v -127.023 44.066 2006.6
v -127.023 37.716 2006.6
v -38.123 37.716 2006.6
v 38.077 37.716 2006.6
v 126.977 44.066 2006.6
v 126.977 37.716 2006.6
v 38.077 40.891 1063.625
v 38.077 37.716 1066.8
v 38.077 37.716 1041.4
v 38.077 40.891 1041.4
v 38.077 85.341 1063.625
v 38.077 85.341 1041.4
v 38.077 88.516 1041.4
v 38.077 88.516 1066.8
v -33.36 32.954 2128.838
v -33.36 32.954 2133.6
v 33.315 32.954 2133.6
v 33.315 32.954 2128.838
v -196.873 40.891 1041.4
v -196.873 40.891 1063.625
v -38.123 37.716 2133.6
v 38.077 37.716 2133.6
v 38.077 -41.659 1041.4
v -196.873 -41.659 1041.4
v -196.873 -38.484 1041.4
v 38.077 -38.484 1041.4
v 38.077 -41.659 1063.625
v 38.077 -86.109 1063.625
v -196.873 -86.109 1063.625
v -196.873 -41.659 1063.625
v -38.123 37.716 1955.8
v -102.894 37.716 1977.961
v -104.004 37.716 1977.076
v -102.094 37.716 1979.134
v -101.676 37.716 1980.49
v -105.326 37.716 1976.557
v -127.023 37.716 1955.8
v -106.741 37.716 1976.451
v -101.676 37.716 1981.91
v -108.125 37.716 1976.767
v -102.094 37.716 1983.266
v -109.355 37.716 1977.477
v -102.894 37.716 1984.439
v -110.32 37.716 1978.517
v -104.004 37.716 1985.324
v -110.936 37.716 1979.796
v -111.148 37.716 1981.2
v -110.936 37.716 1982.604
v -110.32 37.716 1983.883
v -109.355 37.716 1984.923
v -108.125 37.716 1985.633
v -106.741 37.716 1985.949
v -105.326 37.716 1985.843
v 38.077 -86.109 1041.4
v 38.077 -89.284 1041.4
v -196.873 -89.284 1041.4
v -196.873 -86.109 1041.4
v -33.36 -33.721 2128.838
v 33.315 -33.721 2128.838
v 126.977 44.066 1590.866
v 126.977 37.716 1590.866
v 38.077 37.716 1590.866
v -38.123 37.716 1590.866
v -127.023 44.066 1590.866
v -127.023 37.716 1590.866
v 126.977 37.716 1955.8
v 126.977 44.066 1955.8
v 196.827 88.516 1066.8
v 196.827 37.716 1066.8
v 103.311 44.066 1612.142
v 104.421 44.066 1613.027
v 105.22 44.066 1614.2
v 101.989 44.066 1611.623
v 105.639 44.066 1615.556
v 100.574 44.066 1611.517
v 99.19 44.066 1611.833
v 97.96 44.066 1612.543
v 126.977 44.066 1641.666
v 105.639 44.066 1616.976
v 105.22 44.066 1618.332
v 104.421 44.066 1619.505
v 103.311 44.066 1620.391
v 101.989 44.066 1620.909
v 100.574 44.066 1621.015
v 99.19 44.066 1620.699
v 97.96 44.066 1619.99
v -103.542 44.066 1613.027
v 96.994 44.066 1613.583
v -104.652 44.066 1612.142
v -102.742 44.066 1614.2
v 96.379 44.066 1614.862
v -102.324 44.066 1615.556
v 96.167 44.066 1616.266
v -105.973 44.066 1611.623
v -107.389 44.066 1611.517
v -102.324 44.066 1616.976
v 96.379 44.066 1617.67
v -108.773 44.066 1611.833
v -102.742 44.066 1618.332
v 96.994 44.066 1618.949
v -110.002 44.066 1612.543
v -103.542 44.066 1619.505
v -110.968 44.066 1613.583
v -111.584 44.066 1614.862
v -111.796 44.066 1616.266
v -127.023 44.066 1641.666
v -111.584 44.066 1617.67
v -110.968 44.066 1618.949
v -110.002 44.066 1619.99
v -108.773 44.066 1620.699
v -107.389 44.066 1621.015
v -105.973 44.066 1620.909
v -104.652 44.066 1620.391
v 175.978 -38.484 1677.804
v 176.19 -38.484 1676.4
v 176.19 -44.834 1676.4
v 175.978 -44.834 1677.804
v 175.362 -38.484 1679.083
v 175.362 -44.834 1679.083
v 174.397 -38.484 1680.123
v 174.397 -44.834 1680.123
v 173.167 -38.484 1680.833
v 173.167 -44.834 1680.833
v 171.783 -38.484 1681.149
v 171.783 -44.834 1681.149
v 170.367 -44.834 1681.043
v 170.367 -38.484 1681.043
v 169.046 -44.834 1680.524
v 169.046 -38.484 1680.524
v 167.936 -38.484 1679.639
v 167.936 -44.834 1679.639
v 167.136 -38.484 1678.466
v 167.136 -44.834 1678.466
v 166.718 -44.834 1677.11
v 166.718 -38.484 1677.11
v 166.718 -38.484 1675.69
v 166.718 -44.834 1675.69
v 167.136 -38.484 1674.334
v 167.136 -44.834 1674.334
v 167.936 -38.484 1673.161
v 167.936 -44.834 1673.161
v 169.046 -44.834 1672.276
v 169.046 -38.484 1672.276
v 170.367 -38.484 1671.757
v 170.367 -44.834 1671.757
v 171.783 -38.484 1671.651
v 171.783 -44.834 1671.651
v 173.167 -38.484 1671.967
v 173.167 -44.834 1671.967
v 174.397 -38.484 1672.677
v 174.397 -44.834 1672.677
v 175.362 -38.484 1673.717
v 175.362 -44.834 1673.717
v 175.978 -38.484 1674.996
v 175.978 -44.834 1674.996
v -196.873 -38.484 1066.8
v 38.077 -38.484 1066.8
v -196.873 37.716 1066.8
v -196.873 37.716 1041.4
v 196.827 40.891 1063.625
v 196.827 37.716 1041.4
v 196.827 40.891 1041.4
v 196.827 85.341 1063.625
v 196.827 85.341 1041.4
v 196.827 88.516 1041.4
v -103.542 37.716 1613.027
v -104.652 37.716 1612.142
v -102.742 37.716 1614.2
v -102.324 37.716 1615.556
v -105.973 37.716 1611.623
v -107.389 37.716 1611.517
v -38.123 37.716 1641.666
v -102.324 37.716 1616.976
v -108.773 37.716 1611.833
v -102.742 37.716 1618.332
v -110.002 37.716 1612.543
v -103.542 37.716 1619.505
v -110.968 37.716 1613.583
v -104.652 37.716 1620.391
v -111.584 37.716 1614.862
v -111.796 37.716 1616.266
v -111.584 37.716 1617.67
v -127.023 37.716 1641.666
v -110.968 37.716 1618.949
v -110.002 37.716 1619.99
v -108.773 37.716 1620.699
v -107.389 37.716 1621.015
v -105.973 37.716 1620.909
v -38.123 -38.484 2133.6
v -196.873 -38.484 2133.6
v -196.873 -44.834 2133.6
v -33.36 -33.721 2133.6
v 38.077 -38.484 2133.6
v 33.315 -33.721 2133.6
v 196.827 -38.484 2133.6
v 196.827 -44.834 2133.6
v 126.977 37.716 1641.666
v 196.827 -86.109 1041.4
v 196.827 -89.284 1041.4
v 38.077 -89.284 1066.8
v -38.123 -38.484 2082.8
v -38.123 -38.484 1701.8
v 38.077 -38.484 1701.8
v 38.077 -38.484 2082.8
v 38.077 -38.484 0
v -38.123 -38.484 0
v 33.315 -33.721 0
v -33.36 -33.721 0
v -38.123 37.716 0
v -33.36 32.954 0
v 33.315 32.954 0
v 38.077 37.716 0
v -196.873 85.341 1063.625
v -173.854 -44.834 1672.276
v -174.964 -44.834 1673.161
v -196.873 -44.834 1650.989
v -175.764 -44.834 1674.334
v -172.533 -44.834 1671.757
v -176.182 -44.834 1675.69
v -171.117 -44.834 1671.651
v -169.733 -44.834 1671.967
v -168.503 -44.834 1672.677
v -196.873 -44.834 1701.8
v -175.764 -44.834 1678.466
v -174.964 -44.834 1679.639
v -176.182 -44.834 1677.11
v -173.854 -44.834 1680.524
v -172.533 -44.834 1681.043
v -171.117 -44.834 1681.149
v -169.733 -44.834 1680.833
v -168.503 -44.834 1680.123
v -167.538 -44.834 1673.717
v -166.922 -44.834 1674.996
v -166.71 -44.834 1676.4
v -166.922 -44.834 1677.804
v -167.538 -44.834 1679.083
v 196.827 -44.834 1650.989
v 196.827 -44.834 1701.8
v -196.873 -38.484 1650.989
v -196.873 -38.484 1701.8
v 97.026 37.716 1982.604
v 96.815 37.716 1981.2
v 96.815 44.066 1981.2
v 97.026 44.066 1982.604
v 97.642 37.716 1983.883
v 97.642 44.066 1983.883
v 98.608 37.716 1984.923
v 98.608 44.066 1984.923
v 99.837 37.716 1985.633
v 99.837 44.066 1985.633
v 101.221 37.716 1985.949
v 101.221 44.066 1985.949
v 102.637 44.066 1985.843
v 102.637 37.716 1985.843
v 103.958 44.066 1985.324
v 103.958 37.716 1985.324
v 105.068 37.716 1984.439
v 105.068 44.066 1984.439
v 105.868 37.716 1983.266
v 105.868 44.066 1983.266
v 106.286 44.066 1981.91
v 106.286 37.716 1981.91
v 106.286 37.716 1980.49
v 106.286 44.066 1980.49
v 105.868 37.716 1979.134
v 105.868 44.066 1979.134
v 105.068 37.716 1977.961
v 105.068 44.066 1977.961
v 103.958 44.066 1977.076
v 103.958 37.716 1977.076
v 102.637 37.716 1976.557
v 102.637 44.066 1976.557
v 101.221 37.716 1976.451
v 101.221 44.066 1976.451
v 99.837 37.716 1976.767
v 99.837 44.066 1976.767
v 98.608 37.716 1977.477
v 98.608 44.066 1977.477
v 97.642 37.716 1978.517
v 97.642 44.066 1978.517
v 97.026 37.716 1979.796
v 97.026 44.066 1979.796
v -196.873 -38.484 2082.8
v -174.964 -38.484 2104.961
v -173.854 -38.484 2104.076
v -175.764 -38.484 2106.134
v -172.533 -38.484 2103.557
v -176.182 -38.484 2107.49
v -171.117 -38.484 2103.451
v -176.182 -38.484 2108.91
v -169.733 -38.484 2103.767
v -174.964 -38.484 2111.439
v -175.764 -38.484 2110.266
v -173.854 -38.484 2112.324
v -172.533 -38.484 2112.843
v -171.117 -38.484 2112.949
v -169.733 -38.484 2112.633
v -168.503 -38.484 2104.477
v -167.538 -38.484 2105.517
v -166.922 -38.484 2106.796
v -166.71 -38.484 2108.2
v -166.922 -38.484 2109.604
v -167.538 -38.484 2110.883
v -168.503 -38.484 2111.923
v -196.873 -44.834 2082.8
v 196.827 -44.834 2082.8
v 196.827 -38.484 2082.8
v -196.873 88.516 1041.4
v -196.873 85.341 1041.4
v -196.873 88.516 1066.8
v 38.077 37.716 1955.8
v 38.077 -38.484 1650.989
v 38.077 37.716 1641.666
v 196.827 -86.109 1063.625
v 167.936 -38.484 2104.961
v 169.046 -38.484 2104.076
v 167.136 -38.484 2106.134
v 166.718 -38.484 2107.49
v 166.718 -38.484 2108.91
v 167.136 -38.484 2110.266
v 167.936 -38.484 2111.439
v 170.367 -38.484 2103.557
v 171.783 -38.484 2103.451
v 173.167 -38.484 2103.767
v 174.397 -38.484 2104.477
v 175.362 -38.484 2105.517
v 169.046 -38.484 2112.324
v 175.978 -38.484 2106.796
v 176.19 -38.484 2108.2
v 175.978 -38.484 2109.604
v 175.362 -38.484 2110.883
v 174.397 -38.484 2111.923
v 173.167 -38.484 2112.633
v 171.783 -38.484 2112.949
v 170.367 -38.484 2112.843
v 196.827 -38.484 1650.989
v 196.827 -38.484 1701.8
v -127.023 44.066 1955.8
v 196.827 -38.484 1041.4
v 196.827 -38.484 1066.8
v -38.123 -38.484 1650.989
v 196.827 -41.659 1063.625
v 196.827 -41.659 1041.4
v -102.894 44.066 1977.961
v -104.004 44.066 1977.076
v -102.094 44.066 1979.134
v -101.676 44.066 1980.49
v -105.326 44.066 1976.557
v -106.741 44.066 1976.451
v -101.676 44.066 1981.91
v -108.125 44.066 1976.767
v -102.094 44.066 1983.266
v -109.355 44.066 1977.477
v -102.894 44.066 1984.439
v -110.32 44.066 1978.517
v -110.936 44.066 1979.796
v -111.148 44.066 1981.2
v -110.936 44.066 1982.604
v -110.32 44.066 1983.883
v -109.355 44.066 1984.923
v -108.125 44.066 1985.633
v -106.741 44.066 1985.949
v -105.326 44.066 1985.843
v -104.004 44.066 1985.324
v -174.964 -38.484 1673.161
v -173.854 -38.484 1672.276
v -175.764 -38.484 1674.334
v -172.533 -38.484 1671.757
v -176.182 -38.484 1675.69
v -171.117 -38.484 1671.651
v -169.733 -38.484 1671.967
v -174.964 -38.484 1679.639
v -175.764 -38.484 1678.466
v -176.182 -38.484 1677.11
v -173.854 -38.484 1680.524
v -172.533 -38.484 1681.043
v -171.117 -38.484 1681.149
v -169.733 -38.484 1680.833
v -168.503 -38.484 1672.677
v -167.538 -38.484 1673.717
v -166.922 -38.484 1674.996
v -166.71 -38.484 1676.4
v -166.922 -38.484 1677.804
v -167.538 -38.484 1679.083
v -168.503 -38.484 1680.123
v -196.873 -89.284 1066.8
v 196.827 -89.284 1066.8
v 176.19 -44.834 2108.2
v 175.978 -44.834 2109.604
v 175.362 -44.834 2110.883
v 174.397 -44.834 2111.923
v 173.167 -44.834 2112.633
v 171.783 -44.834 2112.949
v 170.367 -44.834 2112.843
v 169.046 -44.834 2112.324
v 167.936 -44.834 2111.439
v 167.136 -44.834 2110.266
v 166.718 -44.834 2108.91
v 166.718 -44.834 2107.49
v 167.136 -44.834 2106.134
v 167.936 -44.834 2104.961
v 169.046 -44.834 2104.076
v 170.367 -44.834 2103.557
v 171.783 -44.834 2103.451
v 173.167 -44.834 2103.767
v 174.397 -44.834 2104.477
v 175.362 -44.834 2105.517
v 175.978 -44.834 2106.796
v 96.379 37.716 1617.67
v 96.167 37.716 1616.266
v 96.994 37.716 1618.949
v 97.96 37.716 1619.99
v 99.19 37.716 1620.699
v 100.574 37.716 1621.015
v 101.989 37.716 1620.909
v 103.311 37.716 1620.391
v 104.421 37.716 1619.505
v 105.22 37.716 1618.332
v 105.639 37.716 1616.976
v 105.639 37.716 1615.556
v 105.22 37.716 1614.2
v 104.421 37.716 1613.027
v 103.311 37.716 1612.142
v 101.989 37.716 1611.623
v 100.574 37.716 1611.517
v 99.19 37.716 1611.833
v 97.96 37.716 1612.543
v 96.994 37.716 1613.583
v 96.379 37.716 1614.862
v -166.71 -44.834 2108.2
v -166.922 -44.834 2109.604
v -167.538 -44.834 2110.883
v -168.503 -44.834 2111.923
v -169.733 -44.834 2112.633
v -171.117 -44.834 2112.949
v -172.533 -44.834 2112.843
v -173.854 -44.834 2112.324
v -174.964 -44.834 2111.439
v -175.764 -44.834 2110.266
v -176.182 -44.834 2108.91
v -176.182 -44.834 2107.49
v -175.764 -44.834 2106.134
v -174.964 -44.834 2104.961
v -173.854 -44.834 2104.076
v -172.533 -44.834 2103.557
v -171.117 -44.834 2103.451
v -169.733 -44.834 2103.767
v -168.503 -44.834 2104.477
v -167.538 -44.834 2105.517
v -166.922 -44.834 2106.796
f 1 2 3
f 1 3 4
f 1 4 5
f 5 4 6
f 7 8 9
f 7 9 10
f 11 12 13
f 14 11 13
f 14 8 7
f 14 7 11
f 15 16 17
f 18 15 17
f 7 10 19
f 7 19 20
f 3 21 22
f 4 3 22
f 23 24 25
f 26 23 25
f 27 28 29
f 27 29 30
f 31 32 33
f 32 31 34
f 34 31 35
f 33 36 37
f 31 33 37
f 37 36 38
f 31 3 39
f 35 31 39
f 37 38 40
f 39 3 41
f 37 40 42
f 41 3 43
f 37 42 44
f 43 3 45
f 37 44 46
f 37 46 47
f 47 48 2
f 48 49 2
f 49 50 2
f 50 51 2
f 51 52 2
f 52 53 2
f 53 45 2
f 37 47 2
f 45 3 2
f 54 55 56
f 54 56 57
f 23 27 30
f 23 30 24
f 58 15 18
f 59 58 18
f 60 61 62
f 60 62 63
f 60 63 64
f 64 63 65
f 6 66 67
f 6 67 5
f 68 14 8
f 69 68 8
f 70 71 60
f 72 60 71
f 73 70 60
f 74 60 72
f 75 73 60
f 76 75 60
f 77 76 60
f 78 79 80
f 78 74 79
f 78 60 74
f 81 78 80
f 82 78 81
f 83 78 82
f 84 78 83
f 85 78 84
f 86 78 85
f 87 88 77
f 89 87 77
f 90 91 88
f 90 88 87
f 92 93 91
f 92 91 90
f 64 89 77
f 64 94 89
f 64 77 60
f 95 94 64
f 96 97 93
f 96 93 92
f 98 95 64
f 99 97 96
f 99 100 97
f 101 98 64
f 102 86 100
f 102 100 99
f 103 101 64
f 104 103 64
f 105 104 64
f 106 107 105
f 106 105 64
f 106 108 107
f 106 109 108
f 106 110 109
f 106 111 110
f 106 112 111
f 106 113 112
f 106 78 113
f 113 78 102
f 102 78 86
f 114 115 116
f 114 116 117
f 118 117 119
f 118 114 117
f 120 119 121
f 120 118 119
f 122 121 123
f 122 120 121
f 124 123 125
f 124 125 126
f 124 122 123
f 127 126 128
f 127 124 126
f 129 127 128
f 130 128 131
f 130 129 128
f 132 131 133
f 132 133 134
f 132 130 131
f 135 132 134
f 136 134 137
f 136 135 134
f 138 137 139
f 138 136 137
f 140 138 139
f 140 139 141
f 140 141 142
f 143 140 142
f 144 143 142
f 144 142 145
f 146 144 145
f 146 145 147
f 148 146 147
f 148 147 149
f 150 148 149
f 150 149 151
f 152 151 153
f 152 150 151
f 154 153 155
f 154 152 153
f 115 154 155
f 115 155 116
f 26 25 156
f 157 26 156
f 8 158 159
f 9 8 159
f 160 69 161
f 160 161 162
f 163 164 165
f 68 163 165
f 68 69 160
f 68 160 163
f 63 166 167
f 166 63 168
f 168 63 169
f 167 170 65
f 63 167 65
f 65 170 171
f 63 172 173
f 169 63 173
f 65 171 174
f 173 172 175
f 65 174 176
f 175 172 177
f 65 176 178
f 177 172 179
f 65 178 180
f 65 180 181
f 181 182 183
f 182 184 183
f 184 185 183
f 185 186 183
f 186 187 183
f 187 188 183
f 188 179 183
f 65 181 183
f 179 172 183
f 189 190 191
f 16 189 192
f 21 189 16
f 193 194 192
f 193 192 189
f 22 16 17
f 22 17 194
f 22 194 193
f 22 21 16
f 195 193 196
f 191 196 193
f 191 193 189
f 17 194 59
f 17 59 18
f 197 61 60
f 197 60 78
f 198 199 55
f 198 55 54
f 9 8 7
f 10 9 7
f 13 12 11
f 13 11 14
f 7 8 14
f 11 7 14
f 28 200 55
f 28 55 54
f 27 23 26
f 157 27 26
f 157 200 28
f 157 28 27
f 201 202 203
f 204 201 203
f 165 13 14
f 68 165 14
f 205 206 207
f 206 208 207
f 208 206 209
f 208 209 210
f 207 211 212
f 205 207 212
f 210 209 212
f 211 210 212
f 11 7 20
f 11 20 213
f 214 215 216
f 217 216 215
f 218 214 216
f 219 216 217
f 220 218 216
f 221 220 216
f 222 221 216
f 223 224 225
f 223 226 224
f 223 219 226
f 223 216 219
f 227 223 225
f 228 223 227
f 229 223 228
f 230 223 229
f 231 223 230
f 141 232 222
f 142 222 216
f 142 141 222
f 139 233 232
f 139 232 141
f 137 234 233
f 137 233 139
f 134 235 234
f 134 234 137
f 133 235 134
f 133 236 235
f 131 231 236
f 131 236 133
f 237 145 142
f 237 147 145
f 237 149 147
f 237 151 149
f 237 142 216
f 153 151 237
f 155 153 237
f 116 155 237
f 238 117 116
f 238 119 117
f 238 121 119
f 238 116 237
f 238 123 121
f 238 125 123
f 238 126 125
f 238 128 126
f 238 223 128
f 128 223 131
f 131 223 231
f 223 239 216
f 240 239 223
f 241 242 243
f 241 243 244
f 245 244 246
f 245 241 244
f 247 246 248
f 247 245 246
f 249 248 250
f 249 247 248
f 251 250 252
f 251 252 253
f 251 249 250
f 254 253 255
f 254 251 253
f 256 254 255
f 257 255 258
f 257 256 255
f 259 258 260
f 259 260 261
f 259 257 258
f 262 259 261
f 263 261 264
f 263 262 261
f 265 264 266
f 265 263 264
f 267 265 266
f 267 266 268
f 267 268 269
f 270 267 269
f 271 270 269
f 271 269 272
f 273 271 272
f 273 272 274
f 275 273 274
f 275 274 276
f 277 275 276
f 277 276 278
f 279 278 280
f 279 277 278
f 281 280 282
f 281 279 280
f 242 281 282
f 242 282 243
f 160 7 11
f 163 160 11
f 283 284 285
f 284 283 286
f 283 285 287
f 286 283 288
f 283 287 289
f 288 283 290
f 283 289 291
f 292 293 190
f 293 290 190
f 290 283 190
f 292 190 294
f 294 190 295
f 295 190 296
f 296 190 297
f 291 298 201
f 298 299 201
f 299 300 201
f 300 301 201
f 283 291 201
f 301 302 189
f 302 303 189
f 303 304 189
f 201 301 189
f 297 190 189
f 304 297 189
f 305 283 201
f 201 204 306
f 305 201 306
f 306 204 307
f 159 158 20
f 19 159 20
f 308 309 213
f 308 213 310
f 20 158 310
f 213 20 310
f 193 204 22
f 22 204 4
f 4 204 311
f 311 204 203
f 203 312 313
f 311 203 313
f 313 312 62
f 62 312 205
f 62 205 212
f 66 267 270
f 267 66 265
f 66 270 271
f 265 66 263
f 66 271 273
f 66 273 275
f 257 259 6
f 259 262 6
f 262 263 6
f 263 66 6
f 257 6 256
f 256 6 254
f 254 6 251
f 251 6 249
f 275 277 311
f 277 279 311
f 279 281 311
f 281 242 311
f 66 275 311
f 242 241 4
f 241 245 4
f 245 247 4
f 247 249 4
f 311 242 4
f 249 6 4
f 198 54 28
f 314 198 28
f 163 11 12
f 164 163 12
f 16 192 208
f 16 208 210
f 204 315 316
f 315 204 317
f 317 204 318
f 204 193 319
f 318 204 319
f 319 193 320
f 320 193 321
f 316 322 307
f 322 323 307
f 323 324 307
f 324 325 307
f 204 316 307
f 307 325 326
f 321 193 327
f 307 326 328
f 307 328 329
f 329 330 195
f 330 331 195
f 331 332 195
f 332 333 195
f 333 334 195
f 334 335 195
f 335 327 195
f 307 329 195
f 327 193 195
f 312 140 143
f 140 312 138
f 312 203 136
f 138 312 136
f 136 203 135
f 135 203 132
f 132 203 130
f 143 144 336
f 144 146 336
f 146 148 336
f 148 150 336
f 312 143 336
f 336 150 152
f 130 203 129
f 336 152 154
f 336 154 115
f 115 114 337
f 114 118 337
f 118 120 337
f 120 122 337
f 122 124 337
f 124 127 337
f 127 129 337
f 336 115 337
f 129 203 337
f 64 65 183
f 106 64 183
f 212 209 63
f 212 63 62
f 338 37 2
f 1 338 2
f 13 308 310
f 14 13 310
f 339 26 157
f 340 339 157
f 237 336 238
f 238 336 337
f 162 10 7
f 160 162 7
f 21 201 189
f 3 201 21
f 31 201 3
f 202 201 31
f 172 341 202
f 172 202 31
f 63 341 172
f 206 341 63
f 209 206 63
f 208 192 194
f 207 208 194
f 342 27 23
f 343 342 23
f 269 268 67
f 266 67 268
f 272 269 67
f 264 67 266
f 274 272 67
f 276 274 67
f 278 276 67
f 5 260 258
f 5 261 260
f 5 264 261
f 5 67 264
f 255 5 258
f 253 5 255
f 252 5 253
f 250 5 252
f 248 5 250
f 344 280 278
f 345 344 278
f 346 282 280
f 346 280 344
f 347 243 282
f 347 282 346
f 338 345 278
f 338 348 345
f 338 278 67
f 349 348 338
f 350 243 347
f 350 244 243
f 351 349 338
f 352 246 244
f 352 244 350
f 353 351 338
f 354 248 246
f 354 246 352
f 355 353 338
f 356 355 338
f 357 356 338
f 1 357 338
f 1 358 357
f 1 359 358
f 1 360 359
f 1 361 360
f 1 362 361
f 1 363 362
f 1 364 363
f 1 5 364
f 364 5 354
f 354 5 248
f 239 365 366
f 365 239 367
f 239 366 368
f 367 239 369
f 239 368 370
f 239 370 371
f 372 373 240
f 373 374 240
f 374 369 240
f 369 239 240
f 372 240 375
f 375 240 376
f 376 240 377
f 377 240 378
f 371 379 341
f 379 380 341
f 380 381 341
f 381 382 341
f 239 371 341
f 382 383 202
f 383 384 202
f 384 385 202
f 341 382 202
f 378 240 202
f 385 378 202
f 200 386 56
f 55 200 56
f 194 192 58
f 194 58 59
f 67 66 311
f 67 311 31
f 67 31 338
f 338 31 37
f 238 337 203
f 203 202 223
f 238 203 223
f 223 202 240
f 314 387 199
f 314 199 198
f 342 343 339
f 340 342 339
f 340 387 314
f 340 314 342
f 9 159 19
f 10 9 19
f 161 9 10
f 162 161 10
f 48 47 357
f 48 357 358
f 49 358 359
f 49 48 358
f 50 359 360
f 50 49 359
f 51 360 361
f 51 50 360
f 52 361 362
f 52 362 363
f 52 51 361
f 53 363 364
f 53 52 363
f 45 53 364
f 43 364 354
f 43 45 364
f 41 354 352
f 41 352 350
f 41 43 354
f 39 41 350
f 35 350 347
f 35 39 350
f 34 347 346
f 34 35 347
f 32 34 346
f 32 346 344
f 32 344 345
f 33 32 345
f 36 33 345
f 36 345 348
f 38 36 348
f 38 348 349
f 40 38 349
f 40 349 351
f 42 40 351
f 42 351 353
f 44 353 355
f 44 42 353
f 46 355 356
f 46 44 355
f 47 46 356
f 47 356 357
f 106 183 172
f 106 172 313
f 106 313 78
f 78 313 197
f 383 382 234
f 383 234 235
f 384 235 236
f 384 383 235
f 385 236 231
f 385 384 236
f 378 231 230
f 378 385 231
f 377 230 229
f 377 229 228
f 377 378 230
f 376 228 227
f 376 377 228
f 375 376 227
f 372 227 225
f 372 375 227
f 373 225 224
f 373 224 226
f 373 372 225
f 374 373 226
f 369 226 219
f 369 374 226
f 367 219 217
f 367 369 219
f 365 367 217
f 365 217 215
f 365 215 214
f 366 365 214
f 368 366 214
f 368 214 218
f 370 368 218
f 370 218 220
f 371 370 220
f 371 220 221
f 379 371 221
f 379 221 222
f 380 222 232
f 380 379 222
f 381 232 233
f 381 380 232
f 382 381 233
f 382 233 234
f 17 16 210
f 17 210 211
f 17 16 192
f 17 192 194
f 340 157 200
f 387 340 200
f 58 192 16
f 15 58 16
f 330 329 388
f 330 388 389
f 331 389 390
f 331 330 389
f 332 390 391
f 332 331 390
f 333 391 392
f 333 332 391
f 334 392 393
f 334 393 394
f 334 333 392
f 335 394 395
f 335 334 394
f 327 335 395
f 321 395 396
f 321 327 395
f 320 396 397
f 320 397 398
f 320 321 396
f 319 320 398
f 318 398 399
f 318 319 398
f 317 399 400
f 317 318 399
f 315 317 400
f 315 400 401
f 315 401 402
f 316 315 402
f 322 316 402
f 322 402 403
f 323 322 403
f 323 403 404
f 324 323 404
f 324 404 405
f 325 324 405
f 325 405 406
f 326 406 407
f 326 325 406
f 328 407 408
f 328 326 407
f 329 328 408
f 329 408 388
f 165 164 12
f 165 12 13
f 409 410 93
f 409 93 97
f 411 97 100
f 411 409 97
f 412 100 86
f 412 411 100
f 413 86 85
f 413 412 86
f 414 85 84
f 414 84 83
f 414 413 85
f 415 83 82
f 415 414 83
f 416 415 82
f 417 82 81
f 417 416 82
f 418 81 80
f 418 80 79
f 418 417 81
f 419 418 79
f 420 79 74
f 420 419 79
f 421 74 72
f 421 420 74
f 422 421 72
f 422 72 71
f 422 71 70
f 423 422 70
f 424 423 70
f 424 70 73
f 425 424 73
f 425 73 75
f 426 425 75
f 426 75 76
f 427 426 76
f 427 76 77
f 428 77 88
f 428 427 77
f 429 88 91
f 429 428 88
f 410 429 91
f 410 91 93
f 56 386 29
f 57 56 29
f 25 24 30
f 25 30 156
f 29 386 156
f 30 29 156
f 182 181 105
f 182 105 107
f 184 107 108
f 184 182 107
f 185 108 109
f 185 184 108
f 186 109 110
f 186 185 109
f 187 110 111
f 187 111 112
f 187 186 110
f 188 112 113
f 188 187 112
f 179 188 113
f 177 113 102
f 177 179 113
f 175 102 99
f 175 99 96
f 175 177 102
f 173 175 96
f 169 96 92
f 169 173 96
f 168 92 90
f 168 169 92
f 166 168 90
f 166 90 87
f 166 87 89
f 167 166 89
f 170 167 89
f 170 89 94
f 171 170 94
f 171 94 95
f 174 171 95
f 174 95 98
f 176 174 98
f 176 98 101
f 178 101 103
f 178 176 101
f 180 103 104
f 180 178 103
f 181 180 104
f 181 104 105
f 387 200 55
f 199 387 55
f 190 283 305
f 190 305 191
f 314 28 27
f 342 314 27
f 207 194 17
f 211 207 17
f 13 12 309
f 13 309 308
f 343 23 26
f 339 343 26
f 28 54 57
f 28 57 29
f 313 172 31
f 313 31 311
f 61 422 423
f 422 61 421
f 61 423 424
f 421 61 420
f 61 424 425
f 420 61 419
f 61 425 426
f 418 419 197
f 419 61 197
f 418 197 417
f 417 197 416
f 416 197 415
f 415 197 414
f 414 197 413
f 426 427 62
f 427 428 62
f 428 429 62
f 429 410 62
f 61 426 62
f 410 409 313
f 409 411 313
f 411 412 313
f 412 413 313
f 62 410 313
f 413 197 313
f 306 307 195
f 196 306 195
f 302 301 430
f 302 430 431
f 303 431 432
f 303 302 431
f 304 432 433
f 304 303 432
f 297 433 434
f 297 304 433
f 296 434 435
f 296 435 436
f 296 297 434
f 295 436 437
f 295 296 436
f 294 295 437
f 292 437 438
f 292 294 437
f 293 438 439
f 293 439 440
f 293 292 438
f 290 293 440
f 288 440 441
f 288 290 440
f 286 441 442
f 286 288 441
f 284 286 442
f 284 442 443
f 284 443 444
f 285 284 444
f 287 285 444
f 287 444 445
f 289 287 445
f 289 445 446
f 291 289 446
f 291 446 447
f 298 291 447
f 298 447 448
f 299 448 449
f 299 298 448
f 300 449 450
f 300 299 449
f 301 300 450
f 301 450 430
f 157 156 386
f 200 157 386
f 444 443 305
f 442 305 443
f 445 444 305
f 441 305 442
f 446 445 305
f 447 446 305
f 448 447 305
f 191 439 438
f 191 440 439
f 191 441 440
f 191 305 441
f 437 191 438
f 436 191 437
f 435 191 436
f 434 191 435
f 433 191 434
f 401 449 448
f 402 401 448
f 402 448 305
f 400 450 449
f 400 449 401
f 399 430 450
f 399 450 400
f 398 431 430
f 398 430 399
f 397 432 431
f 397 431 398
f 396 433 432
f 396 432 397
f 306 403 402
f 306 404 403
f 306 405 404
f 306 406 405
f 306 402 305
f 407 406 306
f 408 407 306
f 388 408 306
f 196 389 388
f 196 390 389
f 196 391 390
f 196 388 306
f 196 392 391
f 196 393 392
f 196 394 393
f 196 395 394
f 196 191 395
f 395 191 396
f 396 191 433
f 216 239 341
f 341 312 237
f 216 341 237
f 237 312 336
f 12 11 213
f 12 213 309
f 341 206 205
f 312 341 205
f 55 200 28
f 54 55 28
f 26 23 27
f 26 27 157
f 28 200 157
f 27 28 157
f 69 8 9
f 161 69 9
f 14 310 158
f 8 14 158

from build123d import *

# Parameters (mm, degrees)
F0_W      = 76.2
F0_H      = 76.2
F0_W_2    = 66.675
F0_H_2    = 66.675
F1_DEPTH  = 2133.6
F2_W      = 66.675
F2_H      = 66.675
F4_DEPTH  = 4.7625
F5_W      = 158.75
F5_H      = 50.8105754852
F5_R      = 4.7625
F5_W_2    = 76.2
F5_H_2    = 50.8
F6_DEPTH  = 6.35
F7_W      = 88.9
F7_H      = 50.8
F7_R      = 4.7625
F7_W_2    = 76.2
F8_DEPTH  = 6.35
F10_DEPTH = 158.75
F11_DEPTH = 234.95


with BuildPart() as f1:
    # F0 (on Top) → F1 (new body)
    with BuildSketch(Plane.XY):
        with Locations((-0.0228539575, -0.3835560492)):
            Rectangle(F0_W, F0_H)
        with Locations((-0.0228539575, -0.3835560492)):
            Rectangle(F0_W_2, F0_H_2, mode=Mode.SUBTRACT)
    extrude(amount=F1_DEPTH)

    # F5 (on face) → F6 (join)
    with BuildSketch(Plane.XZ.offset(38.4835560492)):
        with Locations((-117.4978539575, 1676.3947122574)):
            Rectangle(F5_W, F5_H)
        with Locations((-171.4728539575, 1676.4)):
            Circle(F5_R, mode=Mode.SUBTRACT)
        with Locations((117.4521460425, 1676.3947122574)):
            Rectangle(F5_W, F5_H)
        with Locations((171.4271460425, 1676.4)):
            Circle(F5_R, mode=Mode.SUBTRACT)
        with Locations((-0.0228539575, 1676.3947122574)):
            Rectangle(F5_W_2, F5_H)
        with Locations((-117.4978539575, 2108.2)):
            Rectangle(F5_W, F5_H_2)
        with Locations((-171.4728539575, 2108.2)):
            Circle(F5_R, mode=Mode.SUBTRACT)
        with Locations((-0.0228539575, 2108.2)):
            Rectangle(F5_W_2, F5_H_2)
        with Locations((117.4521460425, 2108.2)):
            Rectangle(F5_W, F5_H_2)
        with Locations((171.4271460425, 2108.2)):
            Circle(F5_R, mode=Mode.SUBTRACT)
    extrude(amount=F6_DEPTH)

    # F7 (on face) → F8 (join)
    with BuildSketch(Plane(origin=(0, 37.7164439508, 0), x_dir=(-1, 0, 0), z_dir=(0, 1, 0))):
        with Locations((-82.5271460425, 1981.2)):
            Rectangle(F7_W, F7_H)
        with Locations((-101.5771460425, 1981.2)):
            Circle(F7_R, mode=Mode.SUBTRACT)
        with Locations((82.5728539575, 1981.2)):
            Rectangle(F7_W, F7_H)
        with Locations((106.3853539575, 1981.2)):
            Circle(F7_R, mode=Mode.SUBTRACT)
        with Locations((82.5728539575, 1616.2660747699)):
            Rectangle(F7_W, F7_H)
        with Locations((107.0330470852, 1616.2660747699)):
            Circle(F7_R, mode=Mode.SUBTRACT)
        with Locations((0.0228539575, 1981.2)):
            Rectangle(F7_W_2, F7_H)
        with Locations((0.0228539575, 1616.2660747699)):
            Rectangle(F7_W_2, F7_H)
        with Locations((-82.5271460425, 1616.2660747699)):
            Rectangle(F7_W, F7_H)
        with Locations((-100.9294529148, 1616.2660747699)):
            Circle(F7_R, mode=Mode.SUBTRACT)
    extrude(amount=F8_DEPTH)


with BuildPart() as f4:
    # F2 (on face) → F4 (new body)
    with BuildSketch(Plane.XY.offset(2133.6)):
        with Locations((-0.0228539575, -0.3835560492)):
            Rectangle(F2_W, F2_H)
    extrude(amount=-F4_DEPTH)


with BuildPart() as f10:
    # F9 (on face) → F10 (new body)
    with BuildSketch(Plane.YZ.offset(38.0771460425)):
        Polygon((-38.4835560492, 1041.4), (-38.4835560492, 1066.8), (-89.2835560492, 1066.8), (-89.2835560492, 1041.4), (-86.1085560492, 1041.4), (-86.1085560492, 1063.625), (-41.6585560492, 1063.625), (-41.6585560492, 1041.4), align=None)
    extrude(amount=F10_DEPTH)


with BuildPart() as f10b:
    # F9 (on face) → F10, piece 2 (new body)
    with BuildSketch(Plane.YZ.offset(38.0771460425)):
        Polygon((37.7164439508, 1066.8), (37.7164439508, 1041.4), (40.8914439508, 1041.4), (40.8914439508, 1063.625), (85.3414439508, 1063.625), (85.3414439508, 1041.4), (88.5164439508, 1041.4), (88.5164439508, 1066.8), align=None)
    extrude(amount=F10_DEPTH)


with BuildPart() as f11:
    # F11 (new): a face of the model
    f11_faces = [f10b.part.faces().sort_by_distance(p)[0] for p in [
        (38.0771460425, 38.2844052171, 1054.1),
    ]]
    extrude(f11_faces, amount=F11_DEPTH)


with BuildPart() as f11b:
    # F11#2 (new): a face of the model
    f11_2_faces = [f10.part.faces().sort_by_distance(p)[0] for p in [
        (38.0771460425, -39.0515173155, 1054.1),
    ]]
    extrude(f11_2_faces, amount=F11_DEPTH)


solid = Compound([f1.part, f4.part, f10.part, f10b.part, f11.part, f11b.part])
